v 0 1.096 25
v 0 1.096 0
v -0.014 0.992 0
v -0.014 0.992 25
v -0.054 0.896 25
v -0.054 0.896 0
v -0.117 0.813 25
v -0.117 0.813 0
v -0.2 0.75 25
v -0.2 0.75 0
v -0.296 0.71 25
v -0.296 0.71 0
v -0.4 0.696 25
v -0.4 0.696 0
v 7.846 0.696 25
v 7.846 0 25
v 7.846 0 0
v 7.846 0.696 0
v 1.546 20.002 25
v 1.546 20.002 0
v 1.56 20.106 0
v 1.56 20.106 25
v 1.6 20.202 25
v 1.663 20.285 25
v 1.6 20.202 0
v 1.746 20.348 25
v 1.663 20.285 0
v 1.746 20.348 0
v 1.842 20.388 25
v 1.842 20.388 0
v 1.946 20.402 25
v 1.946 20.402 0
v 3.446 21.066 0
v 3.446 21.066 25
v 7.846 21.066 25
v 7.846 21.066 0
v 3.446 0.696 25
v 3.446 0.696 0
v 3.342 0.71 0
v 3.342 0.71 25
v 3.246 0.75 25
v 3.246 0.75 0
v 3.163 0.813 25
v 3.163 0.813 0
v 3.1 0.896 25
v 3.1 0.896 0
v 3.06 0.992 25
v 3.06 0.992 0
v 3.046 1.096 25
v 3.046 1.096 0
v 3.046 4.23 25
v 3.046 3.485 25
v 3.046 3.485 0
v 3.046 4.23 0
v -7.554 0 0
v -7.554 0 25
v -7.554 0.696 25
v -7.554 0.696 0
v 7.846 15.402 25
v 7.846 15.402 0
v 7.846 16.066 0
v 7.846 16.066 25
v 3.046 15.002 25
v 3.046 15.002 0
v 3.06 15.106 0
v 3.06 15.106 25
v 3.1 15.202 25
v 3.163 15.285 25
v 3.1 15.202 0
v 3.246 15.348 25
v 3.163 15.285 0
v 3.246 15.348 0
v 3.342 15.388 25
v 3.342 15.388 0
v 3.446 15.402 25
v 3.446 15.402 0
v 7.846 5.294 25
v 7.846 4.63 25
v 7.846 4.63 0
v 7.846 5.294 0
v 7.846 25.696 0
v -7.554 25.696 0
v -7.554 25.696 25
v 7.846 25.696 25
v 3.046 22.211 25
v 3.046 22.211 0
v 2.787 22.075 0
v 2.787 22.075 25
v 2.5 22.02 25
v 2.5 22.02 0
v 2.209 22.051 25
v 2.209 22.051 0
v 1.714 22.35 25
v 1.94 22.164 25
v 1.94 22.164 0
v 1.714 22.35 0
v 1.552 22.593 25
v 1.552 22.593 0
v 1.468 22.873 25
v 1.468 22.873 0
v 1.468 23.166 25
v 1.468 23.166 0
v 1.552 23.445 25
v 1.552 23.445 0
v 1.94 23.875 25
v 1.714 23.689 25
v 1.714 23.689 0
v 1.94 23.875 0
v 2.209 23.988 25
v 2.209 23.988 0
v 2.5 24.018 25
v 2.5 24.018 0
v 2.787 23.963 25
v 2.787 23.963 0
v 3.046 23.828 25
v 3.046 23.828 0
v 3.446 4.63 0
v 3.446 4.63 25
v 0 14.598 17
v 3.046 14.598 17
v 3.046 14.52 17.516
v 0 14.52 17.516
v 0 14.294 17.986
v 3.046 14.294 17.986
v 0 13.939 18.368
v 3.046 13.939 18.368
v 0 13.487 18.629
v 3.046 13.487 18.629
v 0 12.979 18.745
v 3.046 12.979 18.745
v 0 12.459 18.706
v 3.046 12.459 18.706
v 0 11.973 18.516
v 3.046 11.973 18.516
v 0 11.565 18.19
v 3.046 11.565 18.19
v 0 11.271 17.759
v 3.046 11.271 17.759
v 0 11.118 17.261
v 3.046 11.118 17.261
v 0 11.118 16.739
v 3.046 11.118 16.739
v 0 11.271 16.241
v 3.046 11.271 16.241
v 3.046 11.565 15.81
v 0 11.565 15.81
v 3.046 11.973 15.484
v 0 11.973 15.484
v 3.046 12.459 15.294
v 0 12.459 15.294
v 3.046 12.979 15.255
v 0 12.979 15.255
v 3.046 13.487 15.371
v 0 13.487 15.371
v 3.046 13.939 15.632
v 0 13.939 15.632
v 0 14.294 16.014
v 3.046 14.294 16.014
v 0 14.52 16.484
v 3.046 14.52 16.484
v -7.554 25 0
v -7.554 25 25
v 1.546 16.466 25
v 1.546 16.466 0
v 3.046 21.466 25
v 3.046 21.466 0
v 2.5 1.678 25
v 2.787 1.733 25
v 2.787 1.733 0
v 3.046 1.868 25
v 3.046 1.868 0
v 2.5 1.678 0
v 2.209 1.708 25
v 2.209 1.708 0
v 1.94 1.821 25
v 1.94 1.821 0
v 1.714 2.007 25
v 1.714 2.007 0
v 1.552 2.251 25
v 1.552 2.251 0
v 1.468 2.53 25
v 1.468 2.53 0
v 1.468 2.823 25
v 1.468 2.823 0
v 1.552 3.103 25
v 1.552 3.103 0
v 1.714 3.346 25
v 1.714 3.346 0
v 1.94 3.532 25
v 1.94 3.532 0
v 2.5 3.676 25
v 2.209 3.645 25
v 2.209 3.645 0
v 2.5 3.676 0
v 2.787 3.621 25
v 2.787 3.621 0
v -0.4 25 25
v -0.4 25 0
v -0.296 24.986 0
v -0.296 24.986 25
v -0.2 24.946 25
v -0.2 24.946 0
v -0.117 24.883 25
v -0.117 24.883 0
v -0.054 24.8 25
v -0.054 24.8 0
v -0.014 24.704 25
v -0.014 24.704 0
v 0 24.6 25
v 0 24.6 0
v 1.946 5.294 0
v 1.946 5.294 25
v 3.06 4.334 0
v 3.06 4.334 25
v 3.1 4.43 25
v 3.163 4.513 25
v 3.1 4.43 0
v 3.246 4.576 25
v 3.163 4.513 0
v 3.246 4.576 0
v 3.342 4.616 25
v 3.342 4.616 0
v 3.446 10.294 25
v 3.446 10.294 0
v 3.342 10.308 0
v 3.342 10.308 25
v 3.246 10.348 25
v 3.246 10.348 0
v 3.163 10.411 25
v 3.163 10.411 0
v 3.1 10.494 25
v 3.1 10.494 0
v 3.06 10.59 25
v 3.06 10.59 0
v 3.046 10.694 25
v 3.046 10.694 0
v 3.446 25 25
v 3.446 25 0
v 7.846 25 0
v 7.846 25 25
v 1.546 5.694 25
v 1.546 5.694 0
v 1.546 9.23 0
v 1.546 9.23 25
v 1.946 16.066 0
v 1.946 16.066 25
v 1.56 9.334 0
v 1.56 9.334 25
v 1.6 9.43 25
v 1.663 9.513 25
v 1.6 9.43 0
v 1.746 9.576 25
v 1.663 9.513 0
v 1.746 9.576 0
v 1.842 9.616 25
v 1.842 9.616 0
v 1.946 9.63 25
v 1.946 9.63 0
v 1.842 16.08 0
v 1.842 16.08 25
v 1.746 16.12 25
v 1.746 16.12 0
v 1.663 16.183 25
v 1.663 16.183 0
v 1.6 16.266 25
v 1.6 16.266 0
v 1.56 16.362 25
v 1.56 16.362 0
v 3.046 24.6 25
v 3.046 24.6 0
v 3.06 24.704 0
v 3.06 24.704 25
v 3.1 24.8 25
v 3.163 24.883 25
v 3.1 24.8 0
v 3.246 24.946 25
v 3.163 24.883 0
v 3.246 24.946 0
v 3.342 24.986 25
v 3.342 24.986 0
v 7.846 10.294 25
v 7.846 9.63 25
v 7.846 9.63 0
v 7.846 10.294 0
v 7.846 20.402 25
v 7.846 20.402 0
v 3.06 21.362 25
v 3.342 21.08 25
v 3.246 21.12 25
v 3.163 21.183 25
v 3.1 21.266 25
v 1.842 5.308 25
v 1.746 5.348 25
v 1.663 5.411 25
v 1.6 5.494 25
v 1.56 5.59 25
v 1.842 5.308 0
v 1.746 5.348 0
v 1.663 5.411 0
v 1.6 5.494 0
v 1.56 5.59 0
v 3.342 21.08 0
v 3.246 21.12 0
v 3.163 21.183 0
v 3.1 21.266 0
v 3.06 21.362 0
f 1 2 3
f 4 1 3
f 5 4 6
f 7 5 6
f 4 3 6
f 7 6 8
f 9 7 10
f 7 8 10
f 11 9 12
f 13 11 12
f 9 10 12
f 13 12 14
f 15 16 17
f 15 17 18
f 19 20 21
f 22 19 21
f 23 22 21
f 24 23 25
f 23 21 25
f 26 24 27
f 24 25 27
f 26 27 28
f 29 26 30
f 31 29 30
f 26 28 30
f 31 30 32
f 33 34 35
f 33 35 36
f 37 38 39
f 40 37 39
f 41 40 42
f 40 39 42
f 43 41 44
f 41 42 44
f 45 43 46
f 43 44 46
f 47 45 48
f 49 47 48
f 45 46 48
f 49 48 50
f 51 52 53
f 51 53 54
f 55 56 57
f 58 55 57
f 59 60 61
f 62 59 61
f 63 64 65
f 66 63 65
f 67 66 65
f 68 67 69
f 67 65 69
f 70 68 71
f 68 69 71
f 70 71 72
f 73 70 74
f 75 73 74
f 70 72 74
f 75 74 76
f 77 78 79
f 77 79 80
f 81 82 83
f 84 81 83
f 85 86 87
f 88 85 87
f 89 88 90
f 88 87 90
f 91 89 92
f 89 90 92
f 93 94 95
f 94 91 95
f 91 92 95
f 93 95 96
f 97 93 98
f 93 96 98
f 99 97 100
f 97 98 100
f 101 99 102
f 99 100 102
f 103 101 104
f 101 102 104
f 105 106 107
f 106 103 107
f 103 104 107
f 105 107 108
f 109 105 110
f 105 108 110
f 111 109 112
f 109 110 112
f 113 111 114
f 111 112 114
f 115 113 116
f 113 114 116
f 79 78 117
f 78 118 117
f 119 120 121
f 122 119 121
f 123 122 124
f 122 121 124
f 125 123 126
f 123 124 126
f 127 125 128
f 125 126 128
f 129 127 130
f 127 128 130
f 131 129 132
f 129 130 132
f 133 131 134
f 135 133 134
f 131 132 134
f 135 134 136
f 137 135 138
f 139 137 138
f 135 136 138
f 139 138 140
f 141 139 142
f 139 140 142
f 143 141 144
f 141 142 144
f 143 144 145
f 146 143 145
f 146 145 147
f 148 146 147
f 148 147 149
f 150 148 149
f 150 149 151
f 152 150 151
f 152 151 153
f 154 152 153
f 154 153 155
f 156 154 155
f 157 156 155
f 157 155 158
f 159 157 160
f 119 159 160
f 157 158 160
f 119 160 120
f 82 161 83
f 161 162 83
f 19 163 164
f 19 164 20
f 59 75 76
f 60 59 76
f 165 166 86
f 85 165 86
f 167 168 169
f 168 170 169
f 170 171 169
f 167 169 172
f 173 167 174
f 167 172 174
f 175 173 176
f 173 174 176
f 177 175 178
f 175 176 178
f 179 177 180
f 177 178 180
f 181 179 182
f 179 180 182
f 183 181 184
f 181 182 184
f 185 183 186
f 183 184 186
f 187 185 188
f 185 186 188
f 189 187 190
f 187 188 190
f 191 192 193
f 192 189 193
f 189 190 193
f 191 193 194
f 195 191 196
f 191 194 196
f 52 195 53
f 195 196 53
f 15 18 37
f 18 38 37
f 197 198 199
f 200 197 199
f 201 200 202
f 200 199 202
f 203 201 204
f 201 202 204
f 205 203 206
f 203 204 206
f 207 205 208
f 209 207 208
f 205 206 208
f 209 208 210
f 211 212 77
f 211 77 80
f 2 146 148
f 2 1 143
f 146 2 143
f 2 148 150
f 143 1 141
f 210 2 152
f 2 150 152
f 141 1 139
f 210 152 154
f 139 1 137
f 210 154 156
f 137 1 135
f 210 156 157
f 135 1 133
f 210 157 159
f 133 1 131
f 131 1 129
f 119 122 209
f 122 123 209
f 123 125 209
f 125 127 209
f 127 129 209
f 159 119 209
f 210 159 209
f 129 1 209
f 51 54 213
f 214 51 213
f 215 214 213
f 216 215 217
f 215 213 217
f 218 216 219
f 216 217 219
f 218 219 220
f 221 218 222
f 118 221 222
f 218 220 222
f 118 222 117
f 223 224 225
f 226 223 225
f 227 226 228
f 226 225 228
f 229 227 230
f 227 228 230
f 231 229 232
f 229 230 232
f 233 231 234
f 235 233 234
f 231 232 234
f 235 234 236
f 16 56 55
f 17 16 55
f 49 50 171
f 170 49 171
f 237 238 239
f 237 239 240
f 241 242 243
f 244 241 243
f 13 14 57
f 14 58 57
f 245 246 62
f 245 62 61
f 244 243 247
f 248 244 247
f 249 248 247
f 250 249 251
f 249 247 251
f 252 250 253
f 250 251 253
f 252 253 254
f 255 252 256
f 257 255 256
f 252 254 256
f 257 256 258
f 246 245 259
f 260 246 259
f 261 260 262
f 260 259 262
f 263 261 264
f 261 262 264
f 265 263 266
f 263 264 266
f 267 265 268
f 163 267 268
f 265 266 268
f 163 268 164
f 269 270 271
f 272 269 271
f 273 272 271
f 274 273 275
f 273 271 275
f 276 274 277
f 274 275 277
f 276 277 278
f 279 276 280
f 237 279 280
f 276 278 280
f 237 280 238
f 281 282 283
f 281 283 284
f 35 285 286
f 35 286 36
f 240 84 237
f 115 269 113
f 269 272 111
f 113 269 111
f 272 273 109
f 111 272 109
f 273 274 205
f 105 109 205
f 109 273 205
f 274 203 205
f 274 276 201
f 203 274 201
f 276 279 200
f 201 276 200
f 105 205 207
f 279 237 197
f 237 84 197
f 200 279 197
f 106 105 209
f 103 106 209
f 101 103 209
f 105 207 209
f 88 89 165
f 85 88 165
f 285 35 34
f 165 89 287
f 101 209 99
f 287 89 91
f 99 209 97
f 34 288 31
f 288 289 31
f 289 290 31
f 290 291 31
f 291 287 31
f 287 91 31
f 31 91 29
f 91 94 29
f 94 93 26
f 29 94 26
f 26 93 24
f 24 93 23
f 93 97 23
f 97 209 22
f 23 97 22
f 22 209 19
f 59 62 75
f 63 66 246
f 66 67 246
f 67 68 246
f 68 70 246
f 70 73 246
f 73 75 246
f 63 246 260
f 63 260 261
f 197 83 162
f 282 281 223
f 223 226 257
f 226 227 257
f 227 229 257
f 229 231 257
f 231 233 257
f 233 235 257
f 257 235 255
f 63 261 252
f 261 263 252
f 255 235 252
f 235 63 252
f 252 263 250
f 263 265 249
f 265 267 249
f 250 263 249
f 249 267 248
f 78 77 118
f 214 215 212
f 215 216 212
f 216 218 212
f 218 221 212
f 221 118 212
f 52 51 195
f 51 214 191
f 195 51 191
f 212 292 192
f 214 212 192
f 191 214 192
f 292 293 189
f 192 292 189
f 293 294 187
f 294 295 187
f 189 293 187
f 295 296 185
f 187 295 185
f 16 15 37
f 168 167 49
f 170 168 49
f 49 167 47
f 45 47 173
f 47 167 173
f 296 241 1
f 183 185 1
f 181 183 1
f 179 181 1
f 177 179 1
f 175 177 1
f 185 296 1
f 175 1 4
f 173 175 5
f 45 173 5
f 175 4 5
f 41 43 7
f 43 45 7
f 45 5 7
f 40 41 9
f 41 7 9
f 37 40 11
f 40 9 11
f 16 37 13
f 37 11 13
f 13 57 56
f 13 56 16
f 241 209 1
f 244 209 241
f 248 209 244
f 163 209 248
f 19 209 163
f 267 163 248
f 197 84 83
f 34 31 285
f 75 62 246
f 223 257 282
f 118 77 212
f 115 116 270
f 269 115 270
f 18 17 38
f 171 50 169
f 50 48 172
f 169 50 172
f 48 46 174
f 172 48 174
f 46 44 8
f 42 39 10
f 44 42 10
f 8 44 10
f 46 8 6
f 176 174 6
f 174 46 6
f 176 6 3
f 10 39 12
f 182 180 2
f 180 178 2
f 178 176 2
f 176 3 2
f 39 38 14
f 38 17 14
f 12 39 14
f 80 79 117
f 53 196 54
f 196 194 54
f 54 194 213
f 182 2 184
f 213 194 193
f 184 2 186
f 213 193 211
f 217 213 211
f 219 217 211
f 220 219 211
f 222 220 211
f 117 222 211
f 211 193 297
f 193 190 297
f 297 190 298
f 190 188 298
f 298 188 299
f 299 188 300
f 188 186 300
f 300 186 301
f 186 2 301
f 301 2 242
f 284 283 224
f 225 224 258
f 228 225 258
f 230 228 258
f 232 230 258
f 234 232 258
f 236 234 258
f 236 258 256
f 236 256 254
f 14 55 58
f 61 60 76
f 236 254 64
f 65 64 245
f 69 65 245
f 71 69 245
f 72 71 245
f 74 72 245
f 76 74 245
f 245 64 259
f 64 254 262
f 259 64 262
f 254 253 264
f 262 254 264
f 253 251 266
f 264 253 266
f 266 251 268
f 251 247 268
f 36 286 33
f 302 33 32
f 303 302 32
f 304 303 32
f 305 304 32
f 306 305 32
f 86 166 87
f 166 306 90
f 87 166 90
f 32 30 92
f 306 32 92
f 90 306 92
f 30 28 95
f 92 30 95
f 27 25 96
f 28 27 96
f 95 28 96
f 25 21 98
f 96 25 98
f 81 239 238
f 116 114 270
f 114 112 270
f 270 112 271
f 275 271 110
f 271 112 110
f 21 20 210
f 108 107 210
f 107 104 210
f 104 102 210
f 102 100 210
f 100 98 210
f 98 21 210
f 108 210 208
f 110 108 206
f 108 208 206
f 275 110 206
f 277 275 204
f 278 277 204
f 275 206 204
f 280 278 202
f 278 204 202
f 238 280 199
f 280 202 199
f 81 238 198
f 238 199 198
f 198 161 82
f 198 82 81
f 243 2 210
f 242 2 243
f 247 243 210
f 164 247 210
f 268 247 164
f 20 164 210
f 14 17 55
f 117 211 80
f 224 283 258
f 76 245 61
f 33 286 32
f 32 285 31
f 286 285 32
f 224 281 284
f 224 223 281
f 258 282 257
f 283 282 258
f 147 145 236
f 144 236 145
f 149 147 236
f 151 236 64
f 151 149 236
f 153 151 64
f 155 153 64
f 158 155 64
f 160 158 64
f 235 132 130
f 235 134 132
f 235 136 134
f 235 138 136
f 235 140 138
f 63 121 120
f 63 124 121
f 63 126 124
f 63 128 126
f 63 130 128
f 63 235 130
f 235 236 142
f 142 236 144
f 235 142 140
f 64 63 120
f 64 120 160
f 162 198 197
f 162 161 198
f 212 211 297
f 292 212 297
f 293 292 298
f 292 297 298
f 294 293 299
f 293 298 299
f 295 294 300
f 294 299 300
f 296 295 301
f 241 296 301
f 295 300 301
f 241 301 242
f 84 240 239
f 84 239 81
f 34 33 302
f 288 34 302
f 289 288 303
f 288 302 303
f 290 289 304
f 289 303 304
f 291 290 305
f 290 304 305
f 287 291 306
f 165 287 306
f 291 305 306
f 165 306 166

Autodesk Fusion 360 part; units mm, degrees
sketch "Sketch1" plane through (0, 0, 0) normal (1, 0, 0) x (0, 1, 0)
  line L0 (0, 0) -> (25.696, 0)
  line L1 (25.696, 0) -> (25.696, 25)
  line L2 (25.696, 25) -> (0, 25)
  line L3 (0, 25) -> (0, 0)
  dimension "d1" = 25.696
  dimension "d2" = 25
extrude "Extrude1" add sketch "Sketch1" along normal blind 3.046
sketch "Sketch4" plane through (3.046, 0, 0) normal (1, 0, 0) x (0, 1, 0)
  line L0 (0, 25) -> (0, 0)
  line L1 (0, 0) -> (25.696, 0)
  line L2 (25.696, 0) -> (25.696, 25)
  line L3 (25.696, 25) -> (0, 25)
  line L4 (0, 0) -> (0.696, 0)
  line L5 (0.696, 0) -> (0.696, 25)
  line L6 (0.696, 25) -> (0, 25)
  line L7 (0, 25) -> (0, 0)
  line L8 (12.848, 25) -> (12.848, 0) construction
  line L9 (25.696, 25) -> (25.696, 0)
  line L10 (25, 0) -> (25, 25)
  dimension "d15" = 0.696
  dimension "d16" = 25
extrude "Extrude3" add sketch "Sketch4" along normal blind 4.8 and the other way blind 10.6 contours L0 L1 L3 L4 L5 L6 L7 | L1 L2 L3 L9 L10
sketch "Sketch5" plane through (3.046, 0, 0) normal (1, 0, 0) x (0, 1, 0)
  line L0 (25, 0) -> (25, 25)
  line L1 (25, 25) -> (0.696, 25)
  line L2 (0.696, 25) -> (0.696, 0)
  line L3 (0.696, 0) -> (25, 0)
  line L4 (4.63, 25) -> (4.63, 0)
  line L5 (5.294, 25) -> (5.294, 0)
  line L6 (9.63, 25) -> (9.63, 0)
  line L7 (10.294, 25) -> (10.294, 0)
  line L8 (12.848, 25) -> (12.848, 0) construction
  line L9 (21.066, 25) -> (21.066, 0)
  line L10 (20.402, 25) -> (20.402, 0)
  line L11 (16.066, 25) -> (16.066, 0)
  line L12 (15.402, 25) -> (15.402, 0)
  dimension "d21" = -3.934
  dimension "d22" = -4.598
  dimension "d23" = -8.934
  dimension "d24" = -9.598
extrude "Extrude4" add sketch "Sketch5" along normal blind 4.8 contours L1 L3 L9 L10 | L1 L3 L11 L12 | L1 L3 L6 L7 | L1 L3 L4 L5
sketch "Sketch6" plane through (0, 0, 0) normal (0, 0, 1) x (1, 0, 0)
  circle A0 centre (2.4572, 2.6766) radius 1
  line L0 (0, 0) -> (0, 25.696)
  line L1 (0, 12.848) -> (3.046, 12.848) construction
  circle A1 centre (2.4572, 23.0194) radius 1
  dimension "d27" = 2
  dimension "d28" = 25.696
  dimension "d29" = 3.046
extrude "Extrude5" cut sketch "Sketch6" along normal blind 25
sketch "Sketch7" plane through (0, 0, 0) normal (1, 0, 0) x (0, 1, 0)
sketch "Sketch8" plane through (3.046, 0, 0) normal (1, 0, 0) x (0, 1, 0)
  line L0 (15.402, 0) -> (15.402, 25)
  line L1 (15.402, 25) -> (10.294, 25)
  line L2 (10.294, 25) -> (10.294, 0)
  line L3 (10.294, 0) -> (15.402, 0)
  line L4 (12.848, 0) -> (12.848, 17) construction
  circle A0 centre (12.848, 17) radius 1.75
  dimension "d32" = 3.5
extrude "Extrude6" cut sketch "Sketch8" against normal blind 3.046 contours A0
sketch "Sketch9" plane through (0, 0, 0) normal (0, 0, 1) x (1, 0, 0)
sketch "Sketch10" plane through (0, 0, 0) normal (1, 0, 0) x (0, 1, 0)
extrude "Extrude7" cut 1 faces at (3.046, 8.1847, 8.3333) along direction (-1, 0, 0) blind 1.5
sketch "Sketch11" plane through (0, 0, 0) normal (1, 0, 0) x (0, 1, 0)
extrude "Extrude8" cut 1 faces at (3.046, 17.5113, 8.3333) along direction (-1, 0, 0) blind 1.5
fillet "Fillet1" radius 0.4 10 edges at (3.046, 0.696, 12.5) (3.046, 4.63, 12.5) (1.546, 9.63, 12.5) (3.046, 15.402, 12.5) (1.546, 20.402, 12.5) (3.046, 25, 12.5) (1.546, 5.294, 12.5) (3.046, 10.294, 12.5) (1.546, 16.066, 12.5) (3.046, 21.066, 12.5)
fillet "Fillet2" radius 0.4 2 edges at (0, 25, 12.5) (0, 0.696, 12.5)
sketch "Sketch12" plane through (0, 0, 0) normal (1, 0, 0) x (0, 1, 0)
  line L0 (25.696, 25) -> (25.696, 0)
  circle A0 centre (12.848, 17) radius 1.75
  dimension "d45" = 25
  dimension "d46" = 25.696
  dimension "d47" = 3.5
sketch "Sketch13" plane through (0, 0, 0) normal (0, 1, 0) x (1, 0, 0)
  line L0 (7.846, -25) -> (7.846, 0)
  line L1 (-7.554, 0) -> (7.846, 0)
  dimension "d48" = 25
  dimension "d49" = 15.4
sketch "Sketch14" plane through (0, 0, 0) normal (0, 0, 1) x (1, 0, 0)
  arc A0 (3.046, 3.4849) -> (3.046, 1.8683) centre (2.4572, 2.6766) ccw
  line L0 (3.446, 4.63) -> (7.846, 4.63)
  line L1 (7.846, 5.294) -> (1.946, 5.294)
  line L2 (1.546, 5.694) -> (1.546, 9.23)
  line L3 (3.046, 15.002) -> (3.046, 10.694)
  line L4 (3.446, 10.294) -> (7.846, 10.294)
  line L5 (3.446, 0.696) -> (7.846, 0.696)
  point P0 (-7.554, 0)
  point P1 (-7.554, 25.696)
  dimension "d50" = 25.696
  dimension "d51" = 1
  dimension "d53" = 5.9
  dimension "d54" = 3.536
  dimension "d55" = 4.308
  dimension "d56" = 4.4
  dimension "d57" = 4.4
sketch "Sketch15" plane through (0, 0, 0) normal (1, 0, 0) x (0, 1, 0)
  line L0 (9.63, 25) -> (9.63, 0)
  dimension "d58" = 25
equation "d6 = -0.696 mm - 3.934 mm"
equation "d7 = -0.696 mm - 3.934 mm - 0.664 mm"
equation "d8 = -0.696 mm - 3.934 mm - 0.664 mm - 4.336 mm"
equation "d9 = -0.696 mm - 3.934 mm - 0.664 mm - 4.336 mm - 0.664 mm"
equation "d19 = 3.046 mm + 7.554 mm"
equation "d22 = -3.934 mm - 0.664 mm"
equation "d23 = -3.934 mm - 0.664 mm - 4.336 mm"
equation "d24 = -3.934 mm - 0.664 mm - 4.336 mm - 0.664 mm"
